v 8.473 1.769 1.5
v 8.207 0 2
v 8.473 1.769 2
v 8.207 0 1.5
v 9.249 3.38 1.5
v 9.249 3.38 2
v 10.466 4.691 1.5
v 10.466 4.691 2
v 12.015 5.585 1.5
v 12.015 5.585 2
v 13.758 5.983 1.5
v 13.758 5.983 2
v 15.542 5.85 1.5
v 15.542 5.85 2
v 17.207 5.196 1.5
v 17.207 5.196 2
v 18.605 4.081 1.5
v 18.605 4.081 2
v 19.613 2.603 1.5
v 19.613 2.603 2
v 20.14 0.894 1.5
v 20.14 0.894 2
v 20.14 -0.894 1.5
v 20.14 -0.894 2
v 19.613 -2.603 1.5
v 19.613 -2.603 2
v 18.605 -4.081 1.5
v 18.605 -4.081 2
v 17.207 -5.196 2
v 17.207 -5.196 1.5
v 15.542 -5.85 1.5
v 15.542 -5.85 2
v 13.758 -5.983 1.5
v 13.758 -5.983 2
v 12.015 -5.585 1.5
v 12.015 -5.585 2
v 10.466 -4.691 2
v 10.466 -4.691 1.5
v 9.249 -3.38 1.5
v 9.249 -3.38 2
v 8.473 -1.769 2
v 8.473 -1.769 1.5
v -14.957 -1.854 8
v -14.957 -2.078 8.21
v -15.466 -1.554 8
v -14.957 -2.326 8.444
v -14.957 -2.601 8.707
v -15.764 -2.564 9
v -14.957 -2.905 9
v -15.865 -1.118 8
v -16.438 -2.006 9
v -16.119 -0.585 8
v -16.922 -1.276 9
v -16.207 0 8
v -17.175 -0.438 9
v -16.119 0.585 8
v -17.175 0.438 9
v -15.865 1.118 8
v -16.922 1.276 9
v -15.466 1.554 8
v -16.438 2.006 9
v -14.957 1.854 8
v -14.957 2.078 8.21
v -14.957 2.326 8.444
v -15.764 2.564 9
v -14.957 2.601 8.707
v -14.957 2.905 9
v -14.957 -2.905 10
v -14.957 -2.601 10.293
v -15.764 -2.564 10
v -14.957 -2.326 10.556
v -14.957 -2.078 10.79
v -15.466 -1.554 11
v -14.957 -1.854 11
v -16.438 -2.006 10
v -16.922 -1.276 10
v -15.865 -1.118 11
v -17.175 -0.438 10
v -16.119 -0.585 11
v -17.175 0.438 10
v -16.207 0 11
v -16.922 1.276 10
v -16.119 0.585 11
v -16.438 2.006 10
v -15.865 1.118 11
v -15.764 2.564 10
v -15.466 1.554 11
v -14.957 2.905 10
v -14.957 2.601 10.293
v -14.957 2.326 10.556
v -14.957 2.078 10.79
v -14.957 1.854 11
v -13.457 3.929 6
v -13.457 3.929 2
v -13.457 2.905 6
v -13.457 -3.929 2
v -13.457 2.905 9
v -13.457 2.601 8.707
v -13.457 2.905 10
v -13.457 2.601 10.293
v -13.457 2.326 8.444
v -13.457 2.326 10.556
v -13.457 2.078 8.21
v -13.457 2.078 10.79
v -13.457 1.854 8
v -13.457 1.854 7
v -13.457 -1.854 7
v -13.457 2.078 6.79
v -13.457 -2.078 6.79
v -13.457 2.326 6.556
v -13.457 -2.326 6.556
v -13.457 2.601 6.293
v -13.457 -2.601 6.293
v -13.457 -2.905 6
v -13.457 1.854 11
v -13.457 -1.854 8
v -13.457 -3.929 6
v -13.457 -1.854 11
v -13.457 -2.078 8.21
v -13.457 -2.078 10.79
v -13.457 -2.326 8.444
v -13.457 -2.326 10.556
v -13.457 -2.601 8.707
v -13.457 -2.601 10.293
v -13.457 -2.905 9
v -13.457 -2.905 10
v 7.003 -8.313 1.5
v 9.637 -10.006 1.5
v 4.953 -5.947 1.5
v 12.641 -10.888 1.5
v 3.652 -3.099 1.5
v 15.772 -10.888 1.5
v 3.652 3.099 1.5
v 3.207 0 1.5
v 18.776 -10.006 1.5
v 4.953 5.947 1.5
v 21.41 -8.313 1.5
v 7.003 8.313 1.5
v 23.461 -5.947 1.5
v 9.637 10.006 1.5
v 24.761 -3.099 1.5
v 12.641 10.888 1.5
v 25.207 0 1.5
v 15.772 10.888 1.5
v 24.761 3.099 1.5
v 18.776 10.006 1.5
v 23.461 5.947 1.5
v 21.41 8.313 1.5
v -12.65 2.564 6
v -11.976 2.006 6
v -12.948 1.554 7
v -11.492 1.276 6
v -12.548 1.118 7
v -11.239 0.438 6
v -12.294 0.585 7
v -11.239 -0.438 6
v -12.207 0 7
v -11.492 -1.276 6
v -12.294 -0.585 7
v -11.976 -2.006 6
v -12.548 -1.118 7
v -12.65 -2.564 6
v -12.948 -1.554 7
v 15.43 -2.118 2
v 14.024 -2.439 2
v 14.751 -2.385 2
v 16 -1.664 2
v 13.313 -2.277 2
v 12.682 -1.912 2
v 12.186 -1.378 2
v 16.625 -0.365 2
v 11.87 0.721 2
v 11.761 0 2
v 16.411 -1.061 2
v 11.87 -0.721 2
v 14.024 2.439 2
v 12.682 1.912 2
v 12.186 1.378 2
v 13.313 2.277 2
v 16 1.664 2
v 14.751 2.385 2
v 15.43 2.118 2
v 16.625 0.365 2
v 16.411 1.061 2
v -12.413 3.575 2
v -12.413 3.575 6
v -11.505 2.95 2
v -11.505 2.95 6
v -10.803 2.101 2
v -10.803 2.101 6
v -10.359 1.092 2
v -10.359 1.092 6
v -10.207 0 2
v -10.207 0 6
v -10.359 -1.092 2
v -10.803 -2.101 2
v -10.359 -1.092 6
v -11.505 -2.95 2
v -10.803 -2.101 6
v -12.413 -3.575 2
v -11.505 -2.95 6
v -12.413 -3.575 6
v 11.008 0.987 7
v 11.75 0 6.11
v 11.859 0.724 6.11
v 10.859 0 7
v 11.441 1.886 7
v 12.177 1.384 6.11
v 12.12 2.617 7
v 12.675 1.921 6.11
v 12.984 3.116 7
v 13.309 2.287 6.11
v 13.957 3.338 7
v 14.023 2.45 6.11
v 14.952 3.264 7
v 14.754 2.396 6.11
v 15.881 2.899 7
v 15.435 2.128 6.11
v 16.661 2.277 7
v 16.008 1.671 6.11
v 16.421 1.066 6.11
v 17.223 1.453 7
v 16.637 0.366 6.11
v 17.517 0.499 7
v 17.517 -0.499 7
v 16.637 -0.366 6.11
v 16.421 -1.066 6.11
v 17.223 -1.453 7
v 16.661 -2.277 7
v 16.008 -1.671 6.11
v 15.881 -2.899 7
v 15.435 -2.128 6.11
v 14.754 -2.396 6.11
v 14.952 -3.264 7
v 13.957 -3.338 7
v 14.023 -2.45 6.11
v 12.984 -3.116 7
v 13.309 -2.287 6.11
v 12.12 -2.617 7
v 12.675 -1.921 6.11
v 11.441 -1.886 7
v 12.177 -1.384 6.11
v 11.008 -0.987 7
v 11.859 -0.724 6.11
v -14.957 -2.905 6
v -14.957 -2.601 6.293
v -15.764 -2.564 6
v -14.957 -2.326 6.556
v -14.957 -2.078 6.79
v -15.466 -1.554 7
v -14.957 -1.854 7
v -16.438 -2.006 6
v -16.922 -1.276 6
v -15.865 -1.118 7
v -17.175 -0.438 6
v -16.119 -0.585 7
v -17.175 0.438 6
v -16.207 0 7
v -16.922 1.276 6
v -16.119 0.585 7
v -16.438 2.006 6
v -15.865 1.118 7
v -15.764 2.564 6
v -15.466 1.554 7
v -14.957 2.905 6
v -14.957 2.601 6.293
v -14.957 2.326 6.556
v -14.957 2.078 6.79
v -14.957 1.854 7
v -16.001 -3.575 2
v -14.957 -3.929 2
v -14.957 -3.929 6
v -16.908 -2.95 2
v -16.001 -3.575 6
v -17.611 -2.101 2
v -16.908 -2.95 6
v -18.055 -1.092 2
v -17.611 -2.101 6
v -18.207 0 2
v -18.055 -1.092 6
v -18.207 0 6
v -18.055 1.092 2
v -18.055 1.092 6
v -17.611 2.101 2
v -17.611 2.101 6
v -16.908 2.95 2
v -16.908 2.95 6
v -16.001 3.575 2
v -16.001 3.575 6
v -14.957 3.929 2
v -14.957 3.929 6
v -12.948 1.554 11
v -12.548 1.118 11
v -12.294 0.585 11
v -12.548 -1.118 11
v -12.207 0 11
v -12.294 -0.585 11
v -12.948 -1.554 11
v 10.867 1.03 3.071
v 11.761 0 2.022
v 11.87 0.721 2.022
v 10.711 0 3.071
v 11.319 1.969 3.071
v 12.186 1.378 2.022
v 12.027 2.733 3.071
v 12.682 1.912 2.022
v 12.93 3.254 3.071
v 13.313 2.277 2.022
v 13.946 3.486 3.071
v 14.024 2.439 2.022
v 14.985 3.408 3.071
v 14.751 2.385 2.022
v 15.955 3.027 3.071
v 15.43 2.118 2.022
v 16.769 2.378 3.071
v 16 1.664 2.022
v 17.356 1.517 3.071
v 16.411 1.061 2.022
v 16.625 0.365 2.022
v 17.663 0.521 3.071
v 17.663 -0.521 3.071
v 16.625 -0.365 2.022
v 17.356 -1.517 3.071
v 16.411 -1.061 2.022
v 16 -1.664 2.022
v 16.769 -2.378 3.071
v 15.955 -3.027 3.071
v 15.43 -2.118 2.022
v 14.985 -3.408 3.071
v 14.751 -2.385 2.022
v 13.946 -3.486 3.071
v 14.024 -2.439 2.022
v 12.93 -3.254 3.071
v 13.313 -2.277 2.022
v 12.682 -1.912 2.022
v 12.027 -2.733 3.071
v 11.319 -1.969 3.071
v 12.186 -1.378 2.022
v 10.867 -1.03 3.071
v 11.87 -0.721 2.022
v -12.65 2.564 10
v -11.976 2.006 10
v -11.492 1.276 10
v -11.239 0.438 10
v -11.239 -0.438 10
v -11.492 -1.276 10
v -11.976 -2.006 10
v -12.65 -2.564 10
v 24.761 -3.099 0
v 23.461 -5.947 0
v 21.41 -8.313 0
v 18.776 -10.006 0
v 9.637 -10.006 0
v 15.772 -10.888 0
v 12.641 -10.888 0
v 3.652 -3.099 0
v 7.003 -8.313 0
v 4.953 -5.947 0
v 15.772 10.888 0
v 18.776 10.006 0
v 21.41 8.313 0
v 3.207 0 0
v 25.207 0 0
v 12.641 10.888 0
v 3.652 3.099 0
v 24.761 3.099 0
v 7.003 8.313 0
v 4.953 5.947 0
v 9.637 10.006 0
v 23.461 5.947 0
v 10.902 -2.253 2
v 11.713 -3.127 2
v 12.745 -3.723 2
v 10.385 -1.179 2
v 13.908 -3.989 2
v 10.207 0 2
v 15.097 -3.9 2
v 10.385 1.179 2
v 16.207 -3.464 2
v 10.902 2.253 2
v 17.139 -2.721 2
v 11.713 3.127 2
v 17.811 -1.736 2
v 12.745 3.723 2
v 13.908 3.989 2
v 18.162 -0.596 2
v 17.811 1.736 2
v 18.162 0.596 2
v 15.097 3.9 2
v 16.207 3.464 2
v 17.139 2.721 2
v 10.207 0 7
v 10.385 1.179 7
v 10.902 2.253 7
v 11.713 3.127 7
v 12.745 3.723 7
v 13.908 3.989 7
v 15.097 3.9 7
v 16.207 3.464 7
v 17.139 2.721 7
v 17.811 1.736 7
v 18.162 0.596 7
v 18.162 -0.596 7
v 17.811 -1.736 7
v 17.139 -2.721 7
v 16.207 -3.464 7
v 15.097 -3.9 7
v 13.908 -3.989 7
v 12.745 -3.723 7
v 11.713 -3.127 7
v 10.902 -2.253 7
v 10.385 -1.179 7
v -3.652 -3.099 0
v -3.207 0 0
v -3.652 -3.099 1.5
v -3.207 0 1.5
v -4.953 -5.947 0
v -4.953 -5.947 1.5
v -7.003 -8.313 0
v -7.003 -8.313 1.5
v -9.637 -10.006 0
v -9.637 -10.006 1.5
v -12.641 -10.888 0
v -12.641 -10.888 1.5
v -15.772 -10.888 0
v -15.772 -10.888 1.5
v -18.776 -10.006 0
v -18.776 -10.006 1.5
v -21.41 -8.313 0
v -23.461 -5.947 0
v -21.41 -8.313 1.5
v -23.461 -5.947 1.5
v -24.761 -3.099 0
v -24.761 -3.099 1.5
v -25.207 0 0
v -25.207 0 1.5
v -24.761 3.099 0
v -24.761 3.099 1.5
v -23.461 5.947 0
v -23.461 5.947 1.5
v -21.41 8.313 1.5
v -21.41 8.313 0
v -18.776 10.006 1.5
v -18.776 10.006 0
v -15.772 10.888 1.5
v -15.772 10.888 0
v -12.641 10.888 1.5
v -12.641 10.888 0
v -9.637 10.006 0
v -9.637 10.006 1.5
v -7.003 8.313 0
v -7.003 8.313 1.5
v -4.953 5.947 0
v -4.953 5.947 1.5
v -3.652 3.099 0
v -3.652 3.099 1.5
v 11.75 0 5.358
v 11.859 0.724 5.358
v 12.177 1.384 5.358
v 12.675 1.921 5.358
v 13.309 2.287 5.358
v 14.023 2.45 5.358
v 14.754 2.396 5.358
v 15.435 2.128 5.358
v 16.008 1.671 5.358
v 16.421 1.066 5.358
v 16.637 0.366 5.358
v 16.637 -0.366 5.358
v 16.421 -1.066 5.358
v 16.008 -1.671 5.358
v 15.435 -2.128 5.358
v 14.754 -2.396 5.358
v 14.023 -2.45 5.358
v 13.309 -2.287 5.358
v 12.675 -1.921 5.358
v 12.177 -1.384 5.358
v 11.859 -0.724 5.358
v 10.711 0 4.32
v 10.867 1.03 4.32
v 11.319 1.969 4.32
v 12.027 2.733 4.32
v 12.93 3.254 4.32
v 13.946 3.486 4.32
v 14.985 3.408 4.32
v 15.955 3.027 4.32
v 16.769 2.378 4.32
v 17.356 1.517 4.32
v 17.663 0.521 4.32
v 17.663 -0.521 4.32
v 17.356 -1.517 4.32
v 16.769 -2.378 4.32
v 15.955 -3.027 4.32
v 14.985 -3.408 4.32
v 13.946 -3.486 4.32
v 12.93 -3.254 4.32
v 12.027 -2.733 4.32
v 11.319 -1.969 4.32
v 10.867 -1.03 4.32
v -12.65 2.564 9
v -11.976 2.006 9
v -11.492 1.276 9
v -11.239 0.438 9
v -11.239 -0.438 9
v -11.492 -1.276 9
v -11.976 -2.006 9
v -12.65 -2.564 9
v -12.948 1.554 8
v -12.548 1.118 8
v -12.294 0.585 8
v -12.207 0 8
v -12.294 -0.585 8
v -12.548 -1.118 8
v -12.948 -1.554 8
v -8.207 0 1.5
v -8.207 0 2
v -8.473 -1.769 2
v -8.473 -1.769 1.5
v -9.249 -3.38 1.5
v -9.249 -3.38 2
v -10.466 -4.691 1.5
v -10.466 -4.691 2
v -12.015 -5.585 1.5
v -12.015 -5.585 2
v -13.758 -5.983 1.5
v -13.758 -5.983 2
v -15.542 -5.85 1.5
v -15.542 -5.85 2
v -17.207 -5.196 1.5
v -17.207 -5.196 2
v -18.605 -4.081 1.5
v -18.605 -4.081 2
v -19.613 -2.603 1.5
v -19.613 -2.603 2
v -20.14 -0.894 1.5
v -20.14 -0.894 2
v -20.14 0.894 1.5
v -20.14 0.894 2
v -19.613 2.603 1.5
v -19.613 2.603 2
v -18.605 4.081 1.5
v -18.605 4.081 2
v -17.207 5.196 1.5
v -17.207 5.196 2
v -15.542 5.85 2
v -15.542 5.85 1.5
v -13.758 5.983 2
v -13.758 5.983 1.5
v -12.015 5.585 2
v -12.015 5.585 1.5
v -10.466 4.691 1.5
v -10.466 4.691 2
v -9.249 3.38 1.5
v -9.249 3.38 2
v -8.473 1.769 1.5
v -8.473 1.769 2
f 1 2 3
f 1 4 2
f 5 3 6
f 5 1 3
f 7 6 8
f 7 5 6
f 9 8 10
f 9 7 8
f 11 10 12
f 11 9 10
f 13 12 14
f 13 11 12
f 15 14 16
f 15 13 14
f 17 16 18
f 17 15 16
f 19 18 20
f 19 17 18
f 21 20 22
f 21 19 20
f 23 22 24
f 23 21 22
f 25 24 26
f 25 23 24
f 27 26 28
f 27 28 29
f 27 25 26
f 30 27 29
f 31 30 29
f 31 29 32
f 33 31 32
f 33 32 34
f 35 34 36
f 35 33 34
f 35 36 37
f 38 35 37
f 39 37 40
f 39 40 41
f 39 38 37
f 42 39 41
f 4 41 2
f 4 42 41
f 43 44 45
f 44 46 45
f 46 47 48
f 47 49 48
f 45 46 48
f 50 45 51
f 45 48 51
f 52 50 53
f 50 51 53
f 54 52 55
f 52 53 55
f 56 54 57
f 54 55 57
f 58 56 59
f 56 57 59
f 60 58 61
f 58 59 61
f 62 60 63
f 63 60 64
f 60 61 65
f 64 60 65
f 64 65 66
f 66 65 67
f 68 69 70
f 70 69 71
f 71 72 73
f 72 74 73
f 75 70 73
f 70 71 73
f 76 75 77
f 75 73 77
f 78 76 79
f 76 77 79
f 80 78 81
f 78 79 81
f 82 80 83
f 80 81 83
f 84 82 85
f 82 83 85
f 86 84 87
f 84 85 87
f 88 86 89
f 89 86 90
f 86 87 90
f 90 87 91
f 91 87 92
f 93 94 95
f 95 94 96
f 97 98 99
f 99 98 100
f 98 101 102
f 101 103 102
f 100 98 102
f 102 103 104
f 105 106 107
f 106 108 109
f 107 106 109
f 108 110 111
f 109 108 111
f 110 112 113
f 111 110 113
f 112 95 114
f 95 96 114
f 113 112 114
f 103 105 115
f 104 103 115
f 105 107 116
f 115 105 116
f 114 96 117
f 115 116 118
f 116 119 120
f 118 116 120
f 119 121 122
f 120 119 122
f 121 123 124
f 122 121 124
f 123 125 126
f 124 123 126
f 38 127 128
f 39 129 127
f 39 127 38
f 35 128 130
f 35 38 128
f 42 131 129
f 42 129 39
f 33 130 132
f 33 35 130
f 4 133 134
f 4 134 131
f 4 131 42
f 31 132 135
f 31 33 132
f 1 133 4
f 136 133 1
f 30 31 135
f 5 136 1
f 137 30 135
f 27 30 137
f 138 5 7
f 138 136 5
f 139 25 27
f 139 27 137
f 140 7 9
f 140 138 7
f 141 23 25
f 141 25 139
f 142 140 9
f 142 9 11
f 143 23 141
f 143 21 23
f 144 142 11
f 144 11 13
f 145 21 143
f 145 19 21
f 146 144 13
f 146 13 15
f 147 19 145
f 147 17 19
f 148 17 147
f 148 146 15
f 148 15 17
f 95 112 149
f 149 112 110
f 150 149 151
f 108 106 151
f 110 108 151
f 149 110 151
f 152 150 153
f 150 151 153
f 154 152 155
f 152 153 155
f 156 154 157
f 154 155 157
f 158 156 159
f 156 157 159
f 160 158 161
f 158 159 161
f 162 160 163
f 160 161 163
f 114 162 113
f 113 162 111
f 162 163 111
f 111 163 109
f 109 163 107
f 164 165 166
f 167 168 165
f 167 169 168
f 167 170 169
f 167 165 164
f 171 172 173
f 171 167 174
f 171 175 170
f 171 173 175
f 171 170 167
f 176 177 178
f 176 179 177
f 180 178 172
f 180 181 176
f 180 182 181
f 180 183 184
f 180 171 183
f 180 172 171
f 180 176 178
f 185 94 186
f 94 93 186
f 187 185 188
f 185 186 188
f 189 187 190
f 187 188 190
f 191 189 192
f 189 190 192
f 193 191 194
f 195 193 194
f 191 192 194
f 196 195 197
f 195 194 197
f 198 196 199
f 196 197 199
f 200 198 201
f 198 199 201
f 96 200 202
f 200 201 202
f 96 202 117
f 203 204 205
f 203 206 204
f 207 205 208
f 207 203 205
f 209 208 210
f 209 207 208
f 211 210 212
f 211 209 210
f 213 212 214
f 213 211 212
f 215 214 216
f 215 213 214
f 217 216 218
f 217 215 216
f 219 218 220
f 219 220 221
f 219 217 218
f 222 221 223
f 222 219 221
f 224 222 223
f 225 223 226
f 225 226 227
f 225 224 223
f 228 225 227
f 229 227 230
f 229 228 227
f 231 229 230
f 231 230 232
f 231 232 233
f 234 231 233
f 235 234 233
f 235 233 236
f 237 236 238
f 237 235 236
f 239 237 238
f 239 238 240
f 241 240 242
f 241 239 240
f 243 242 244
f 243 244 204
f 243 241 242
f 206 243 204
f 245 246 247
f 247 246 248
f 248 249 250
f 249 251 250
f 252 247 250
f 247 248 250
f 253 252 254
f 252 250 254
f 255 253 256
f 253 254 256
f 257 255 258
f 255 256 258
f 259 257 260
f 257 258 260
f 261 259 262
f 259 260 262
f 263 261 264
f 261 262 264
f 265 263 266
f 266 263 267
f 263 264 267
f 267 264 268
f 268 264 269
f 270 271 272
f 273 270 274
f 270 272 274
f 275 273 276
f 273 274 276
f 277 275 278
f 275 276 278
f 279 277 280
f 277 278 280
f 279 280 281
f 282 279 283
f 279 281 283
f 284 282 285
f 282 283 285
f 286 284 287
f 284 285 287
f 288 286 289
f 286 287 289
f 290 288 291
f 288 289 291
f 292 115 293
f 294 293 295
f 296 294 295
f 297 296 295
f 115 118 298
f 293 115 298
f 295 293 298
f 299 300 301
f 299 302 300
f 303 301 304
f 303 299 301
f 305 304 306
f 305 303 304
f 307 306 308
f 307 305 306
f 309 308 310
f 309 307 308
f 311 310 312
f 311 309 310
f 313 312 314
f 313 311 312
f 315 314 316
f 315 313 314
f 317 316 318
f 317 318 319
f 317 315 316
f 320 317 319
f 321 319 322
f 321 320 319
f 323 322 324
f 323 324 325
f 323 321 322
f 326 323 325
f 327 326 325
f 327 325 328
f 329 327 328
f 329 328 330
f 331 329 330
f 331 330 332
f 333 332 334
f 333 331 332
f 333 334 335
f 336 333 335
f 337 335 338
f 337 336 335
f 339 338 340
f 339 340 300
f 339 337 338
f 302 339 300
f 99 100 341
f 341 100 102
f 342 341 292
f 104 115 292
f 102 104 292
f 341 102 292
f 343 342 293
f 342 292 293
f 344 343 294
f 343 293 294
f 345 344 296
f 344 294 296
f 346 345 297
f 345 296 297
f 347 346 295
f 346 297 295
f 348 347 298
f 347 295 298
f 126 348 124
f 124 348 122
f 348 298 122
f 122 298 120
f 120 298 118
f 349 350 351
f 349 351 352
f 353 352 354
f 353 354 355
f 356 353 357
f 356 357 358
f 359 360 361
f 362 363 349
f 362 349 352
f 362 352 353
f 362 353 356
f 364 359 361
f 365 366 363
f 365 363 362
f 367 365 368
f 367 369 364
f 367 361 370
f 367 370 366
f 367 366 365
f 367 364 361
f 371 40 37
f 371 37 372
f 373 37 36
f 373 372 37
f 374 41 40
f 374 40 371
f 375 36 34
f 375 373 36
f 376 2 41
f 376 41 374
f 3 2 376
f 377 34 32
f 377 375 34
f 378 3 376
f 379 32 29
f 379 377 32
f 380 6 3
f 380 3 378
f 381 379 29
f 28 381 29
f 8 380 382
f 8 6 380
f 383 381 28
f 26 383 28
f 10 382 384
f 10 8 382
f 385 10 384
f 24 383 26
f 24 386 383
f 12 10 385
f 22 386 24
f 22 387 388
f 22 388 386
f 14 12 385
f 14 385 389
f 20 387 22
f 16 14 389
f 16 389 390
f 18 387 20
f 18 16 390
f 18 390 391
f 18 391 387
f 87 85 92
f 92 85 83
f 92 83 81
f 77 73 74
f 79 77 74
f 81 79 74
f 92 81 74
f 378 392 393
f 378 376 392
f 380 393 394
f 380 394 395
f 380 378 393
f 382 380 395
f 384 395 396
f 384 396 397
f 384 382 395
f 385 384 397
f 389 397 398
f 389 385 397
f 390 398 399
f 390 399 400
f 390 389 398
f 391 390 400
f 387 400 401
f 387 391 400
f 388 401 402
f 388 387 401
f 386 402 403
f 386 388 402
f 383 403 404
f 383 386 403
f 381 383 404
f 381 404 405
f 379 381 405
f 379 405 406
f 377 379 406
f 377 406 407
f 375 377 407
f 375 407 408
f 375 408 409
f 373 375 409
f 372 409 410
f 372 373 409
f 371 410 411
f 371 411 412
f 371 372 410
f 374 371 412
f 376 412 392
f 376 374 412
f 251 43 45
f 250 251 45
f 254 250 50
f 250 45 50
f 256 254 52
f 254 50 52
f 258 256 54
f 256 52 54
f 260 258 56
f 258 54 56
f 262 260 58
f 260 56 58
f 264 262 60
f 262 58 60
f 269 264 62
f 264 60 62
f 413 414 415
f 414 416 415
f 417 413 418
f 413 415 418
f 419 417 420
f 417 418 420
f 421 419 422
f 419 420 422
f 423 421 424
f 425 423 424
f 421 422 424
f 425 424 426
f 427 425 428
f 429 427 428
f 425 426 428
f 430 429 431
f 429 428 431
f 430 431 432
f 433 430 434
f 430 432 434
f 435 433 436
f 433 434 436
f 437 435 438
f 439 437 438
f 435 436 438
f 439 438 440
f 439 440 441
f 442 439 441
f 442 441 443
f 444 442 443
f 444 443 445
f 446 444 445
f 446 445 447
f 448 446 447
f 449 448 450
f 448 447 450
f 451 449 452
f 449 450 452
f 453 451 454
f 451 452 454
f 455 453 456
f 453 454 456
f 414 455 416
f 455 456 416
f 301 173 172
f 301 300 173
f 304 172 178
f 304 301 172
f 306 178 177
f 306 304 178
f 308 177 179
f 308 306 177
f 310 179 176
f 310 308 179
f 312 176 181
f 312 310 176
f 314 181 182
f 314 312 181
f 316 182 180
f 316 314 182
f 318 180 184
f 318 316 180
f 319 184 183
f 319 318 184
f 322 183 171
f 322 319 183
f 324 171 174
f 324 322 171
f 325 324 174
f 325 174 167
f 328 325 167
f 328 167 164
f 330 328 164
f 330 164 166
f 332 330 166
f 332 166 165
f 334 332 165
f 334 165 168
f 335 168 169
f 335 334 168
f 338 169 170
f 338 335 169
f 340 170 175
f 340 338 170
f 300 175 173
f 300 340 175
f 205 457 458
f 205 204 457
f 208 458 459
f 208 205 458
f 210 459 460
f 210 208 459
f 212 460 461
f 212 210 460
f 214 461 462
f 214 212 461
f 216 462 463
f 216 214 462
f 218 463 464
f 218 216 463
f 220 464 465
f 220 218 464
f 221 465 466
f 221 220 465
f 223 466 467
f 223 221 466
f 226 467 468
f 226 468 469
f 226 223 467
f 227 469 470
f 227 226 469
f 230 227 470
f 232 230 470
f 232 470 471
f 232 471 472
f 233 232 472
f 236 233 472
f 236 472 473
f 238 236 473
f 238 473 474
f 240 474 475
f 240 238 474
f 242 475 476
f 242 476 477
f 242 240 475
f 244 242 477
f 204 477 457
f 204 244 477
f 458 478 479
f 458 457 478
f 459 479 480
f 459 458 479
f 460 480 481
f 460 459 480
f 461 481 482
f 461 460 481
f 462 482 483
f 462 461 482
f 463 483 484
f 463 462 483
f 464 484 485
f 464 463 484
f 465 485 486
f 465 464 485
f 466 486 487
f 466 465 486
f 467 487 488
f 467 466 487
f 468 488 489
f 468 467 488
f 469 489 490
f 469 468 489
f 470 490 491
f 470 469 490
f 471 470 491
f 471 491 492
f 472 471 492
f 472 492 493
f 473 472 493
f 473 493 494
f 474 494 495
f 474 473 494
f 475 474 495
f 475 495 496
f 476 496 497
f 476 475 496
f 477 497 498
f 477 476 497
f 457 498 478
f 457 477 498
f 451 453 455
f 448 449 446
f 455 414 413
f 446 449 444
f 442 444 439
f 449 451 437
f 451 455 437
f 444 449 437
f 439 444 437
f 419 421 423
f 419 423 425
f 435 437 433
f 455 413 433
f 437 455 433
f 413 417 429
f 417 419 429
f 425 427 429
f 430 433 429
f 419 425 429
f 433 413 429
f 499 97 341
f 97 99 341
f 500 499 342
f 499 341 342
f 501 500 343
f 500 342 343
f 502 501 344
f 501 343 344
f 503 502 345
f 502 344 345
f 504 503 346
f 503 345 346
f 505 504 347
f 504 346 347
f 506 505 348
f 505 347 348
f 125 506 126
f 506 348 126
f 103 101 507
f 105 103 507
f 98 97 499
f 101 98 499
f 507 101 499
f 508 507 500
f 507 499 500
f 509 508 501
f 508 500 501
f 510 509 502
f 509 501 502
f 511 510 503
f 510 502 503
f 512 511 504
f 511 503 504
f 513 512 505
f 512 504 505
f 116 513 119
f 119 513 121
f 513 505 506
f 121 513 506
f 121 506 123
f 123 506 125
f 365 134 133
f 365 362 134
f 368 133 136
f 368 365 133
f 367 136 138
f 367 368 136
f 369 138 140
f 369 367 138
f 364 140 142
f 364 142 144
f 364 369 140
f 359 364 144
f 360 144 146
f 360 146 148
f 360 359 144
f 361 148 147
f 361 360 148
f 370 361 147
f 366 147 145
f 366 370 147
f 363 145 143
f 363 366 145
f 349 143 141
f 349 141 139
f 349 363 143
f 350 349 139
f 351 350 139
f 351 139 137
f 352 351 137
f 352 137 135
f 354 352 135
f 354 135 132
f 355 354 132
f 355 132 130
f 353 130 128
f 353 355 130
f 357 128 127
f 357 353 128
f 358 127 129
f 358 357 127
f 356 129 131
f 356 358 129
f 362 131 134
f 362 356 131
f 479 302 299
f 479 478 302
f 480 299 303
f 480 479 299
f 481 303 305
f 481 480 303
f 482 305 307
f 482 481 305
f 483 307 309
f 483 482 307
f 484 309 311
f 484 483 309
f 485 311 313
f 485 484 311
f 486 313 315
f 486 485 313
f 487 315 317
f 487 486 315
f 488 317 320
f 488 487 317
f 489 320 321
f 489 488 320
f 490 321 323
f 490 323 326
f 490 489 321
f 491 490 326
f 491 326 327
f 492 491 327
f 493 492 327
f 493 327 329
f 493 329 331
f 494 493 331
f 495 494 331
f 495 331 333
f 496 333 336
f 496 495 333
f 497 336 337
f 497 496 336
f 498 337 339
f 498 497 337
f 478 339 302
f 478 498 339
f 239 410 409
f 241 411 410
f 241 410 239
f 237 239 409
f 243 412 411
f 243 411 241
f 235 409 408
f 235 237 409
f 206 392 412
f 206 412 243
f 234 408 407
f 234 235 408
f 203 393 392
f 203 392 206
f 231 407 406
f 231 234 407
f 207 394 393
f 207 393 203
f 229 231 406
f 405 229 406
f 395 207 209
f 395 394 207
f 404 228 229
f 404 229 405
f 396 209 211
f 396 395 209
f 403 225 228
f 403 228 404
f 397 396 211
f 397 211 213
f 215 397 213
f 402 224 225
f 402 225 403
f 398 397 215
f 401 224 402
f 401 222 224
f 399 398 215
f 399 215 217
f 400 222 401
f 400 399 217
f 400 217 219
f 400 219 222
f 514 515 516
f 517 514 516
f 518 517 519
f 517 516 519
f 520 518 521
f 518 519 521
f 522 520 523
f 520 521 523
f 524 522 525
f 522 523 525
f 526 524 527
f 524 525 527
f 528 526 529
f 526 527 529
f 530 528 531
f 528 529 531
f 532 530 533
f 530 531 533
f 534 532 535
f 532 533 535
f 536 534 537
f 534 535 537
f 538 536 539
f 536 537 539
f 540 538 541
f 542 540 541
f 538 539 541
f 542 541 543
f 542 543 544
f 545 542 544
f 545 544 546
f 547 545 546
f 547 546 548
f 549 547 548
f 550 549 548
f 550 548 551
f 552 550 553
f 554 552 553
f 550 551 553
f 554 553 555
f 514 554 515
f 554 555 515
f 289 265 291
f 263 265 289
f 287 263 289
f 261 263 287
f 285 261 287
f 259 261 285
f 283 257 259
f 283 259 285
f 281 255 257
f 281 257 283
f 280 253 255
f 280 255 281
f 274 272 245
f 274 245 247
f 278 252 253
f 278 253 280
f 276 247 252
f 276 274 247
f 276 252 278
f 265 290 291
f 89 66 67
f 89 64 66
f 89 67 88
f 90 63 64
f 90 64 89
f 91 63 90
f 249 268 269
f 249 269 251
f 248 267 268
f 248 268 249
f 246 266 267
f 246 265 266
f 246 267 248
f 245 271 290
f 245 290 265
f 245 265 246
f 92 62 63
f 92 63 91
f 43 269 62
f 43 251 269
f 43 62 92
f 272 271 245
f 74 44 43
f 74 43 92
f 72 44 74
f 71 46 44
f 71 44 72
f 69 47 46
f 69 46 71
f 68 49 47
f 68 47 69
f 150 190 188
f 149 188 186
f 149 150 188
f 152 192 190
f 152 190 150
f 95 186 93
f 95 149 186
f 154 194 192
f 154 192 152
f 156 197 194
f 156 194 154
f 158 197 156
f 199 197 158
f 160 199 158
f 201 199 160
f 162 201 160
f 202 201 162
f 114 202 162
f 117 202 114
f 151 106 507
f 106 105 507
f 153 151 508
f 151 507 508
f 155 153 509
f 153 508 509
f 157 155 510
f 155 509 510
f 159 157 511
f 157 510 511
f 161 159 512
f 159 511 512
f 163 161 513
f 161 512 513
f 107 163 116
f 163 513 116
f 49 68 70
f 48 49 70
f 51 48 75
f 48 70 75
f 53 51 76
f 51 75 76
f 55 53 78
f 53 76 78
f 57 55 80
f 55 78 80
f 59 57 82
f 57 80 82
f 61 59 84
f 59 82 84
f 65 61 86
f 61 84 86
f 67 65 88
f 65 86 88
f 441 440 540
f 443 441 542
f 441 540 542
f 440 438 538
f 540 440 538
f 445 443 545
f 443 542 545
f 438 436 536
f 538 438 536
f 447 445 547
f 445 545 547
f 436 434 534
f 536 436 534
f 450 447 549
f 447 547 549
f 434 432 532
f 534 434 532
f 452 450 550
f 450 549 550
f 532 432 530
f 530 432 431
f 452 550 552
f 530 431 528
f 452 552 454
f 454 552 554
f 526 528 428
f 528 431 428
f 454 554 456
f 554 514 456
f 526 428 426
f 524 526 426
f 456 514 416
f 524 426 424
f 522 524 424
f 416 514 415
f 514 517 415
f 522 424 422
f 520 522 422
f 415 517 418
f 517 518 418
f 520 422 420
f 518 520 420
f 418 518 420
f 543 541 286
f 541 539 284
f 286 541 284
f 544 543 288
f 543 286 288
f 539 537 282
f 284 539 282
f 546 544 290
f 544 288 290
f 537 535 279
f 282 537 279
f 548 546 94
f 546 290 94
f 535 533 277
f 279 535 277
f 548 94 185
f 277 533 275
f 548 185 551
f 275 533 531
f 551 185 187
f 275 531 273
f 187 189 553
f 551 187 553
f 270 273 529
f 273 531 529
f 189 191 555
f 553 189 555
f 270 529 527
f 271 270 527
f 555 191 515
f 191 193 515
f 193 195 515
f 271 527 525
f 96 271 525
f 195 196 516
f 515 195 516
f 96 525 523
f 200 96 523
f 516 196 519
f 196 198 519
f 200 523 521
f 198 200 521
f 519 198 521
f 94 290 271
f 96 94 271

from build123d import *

# Parameters (mm, degrees)
F0_W     = 0.75
F0_H     = 9
F0_W_2   = 1
F0_H_2   = 4
F2_DEPTH = 12.5


with BuildPart() as f1:
    # F0 (on Front) → F1 (revolve)
    with BuildSketch(Plane.XZ):
        Polygon((-14.20681, 1.5), (-14.20681, 0), (-3.20681, 0), (-3.20681, 1.5), (-8.20681, 1.5), align=None)
        Polygon((-14.20681, 2), (-14.20681, 1.5), (-8.20681, 1.5), (-8.20681, 2), (-10.20681, 2), (-11.20681, 2), (-13.45681, 2), align=None)
        with Locations((-13.83181, 6.5)):
            Rectangle(F0_W, F0_H)
        with Locations((-10.70681, 4)):
            Rectangle(F0_W_2, F0_H_2)
        Polygon((-13.45681, 11), (-13.45681, 2), (-11.20681, 2), (-11.20681, 6), (-12.20681, 7), (-12.20681, 8), (-11.20681, 9), (-11.20681, 10), (-12.20681, 11), align=None)
    revolve(axis=Axis((-14.20681, 0, 6.5), (0, 0, -1)))

    # F0 (on Front) → F2 (cut, symmetric)
    with BuildSketch(Plane.XZ):
        with Locations((-13.83181, 6.5)):
            Rectangle(F0_W, F0_H)
        with Locations((-14.58181, 6.5)):
            Rectangle(F0_W, F0_H)
    extrude(amount=F2_DEPTH, both=True, mode=Mode.SUBTRACT)


with BuildPart() as f3:
    # F0 (on Front) → F3 (revolve)
    with BuildSketch(Plane.XZ):
        Polygon((10.20681, 7), (10.20681, 2), (11.760858, 2), (11.760858, 2.021688), (10.711263, 3.071283), (10.711263, 4.319811), (11.749536, 5.358084), (11.749536, 6.109556), (10.859091, 7), align=None)
        Polygon((8.20681, 1.5), (14.20681, 1.5), (14.20681, 2), (12.20681, 2), (11.760858, 2), (10.20681, 2), (8.20681, 2), align=None)
        Polygon((3.20681, 0), (14.20681, 0), (14.20681, 1.5), (8.20681, 1.5), (3.20681, 1.5), align=None)
    revolve(axis=Axis((14.20681, 0, 4.5), (0, 0, -1)))


solid = Compound([f1.part, f3.part])
